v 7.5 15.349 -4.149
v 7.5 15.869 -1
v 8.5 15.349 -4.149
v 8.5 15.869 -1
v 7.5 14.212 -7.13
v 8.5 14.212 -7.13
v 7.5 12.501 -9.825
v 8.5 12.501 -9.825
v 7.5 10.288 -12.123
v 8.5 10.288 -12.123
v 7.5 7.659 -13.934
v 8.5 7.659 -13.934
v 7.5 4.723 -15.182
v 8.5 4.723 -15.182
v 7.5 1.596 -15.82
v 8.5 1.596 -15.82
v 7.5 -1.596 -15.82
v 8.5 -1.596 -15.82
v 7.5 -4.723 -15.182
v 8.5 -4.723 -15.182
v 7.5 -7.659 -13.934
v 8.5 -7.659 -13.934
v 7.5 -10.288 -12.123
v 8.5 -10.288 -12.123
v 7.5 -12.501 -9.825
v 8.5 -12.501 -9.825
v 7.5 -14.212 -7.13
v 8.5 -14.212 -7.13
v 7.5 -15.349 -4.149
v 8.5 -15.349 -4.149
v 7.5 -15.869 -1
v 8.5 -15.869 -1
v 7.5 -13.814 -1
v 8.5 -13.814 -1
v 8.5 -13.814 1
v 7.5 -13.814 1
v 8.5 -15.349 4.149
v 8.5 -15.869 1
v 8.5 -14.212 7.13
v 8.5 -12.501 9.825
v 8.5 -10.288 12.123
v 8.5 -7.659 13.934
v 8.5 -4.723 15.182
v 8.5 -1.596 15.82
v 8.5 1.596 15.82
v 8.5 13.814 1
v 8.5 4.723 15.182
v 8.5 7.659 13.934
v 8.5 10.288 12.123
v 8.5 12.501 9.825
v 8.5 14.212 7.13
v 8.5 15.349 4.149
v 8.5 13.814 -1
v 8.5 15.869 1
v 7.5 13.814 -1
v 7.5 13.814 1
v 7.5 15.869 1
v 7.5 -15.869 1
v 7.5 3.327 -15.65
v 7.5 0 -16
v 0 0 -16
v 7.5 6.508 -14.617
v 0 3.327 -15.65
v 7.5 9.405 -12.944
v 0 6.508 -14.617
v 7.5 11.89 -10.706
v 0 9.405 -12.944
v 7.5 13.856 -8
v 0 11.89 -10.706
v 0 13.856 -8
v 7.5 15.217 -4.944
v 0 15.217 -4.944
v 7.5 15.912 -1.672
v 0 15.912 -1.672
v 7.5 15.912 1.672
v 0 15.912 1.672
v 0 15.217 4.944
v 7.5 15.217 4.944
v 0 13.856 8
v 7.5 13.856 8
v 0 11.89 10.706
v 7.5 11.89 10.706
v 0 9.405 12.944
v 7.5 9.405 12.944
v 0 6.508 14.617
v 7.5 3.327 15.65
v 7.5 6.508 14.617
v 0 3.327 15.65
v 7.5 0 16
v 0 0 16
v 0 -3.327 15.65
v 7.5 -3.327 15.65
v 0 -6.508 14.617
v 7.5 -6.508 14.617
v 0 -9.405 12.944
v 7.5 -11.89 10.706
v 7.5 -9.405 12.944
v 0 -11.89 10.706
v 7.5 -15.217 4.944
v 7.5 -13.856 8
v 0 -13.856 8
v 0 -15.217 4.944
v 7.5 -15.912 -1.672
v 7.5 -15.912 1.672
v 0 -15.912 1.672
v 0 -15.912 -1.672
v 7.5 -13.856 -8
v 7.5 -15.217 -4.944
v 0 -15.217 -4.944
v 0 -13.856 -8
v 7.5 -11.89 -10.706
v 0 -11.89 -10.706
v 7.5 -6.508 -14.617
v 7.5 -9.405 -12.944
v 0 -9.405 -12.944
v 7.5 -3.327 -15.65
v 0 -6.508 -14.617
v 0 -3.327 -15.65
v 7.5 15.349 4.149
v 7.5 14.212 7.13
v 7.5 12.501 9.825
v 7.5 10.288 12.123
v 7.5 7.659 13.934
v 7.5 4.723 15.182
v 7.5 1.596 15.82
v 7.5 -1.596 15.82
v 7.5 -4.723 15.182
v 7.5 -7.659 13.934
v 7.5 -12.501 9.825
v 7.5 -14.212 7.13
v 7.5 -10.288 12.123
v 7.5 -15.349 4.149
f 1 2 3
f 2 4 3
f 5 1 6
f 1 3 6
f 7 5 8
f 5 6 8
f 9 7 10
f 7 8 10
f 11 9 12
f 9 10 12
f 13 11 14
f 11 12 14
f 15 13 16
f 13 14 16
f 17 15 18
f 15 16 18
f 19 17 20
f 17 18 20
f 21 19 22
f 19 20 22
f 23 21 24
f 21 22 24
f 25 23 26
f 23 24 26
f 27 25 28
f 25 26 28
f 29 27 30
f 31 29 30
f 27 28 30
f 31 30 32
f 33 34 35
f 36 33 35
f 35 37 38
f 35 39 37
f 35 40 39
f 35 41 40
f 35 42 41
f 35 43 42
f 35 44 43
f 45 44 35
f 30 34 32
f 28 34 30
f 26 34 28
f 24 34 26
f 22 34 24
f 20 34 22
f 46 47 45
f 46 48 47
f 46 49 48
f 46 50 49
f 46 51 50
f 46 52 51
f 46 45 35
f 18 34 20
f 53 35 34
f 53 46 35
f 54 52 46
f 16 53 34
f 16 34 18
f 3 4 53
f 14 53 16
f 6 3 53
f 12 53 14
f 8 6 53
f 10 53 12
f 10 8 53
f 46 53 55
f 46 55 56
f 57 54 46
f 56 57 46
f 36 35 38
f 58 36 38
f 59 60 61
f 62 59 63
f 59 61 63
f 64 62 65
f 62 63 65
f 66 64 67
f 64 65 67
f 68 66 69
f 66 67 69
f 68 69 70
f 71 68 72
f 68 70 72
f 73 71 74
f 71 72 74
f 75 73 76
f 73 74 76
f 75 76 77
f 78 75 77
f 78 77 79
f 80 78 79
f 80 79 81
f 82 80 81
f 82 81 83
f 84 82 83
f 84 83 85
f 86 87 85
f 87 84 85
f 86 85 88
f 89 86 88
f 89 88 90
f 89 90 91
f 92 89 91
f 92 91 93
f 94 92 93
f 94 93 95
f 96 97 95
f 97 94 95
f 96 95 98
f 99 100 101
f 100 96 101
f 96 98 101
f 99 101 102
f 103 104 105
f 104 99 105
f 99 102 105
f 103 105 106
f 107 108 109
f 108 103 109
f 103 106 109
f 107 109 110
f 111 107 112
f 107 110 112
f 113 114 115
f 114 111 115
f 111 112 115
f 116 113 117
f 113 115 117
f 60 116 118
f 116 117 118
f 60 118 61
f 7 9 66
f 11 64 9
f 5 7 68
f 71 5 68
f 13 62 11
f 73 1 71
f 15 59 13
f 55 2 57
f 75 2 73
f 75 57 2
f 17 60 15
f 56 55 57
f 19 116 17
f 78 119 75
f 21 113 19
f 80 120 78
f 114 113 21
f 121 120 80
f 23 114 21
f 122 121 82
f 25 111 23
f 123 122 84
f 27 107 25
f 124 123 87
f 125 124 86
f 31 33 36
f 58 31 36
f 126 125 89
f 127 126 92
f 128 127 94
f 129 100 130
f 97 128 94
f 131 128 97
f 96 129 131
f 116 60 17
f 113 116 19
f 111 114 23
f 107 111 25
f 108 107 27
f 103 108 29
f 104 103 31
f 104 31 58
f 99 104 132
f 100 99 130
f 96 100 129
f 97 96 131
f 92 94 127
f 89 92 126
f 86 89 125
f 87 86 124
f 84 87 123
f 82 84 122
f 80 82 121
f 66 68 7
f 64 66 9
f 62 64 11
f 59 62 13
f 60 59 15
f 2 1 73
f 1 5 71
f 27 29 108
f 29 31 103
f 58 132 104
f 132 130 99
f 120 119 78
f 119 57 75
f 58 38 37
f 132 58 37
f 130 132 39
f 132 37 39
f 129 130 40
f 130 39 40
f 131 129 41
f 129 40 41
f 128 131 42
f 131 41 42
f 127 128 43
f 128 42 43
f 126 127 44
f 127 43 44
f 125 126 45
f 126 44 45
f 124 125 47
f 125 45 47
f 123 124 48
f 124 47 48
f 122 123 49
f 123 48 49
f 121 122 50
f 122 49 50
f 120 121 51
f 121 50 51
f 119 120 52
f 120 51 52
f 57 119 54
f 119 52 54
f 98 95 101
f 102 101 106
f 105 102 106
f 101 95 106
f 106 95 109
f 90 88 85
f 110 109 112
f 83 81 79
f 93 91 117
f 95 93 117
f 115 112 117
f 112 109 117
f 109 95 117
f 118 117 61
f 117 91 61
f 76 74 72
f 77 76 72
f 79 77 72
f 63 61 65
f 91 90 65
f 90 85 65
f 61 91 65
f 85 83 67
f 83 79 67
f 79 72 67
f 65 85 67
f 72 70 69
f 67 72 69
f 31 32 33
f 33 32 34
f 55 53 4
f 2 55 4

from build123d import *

# Parameters (mm, degrees)
SKETCH1_R           = 16
BOSS_EXTRUDE1_DEPTH = 8.5
SKETCH2_W           = 1
SKETCH2_H           = 0.1
CUT_EXTRUDE1_DEPTH  = 1


with BuildPart() as part:
    # Sketch1 → Boss-Extrude1 (new body)
    with BuildSketch(Plane(origin=(0, 0, 0), x_dir=(0, 0, -1), z_dir=(1, 0, 0))):
        Circle(SKETCH1_R)
    extrude(amount=BOSS_EXTRUDE1_DEPTH)

    # Sketch2 → Cut-Revolve1 (revolve, cut)
    with BuildSketch(Plane.XY, mode=Mode.PRIVATE) as cut_revolve1_sk:
        with Locations((8, 15.95)):
            Rectangle(SKETCH2_W, SKETCH2_H)
    revolve(cut_revolve1_sk.sketch.rotate(Axis((8.5, 0, 0), (-1, 0, 0)), 90), axis=Axis((8.5, 0, 0), (-1, 0, 0)), mode=Mode.SUBTRACT)

    # Sketch3 → Cut-Extrude1 (cut)
    with BuildSketch(Plane(origin=(8.5, 0, 0), x_dir=(0, 0, -1), z_dir=(1, 0, 0))):
        Polygon((-1, 15.814143289), (-1, 17.814143289), (1, 17.814143289), (1, 15.814143289), (1, 13.814143289), (-1, 13.814143289), align=None)
        Polygon((1, -17.814143289), (1, -15.814143289), (1, -13.814143289), (-1, -13.814143289), (-1, -15.814143289), (-1, -17.814143289), align=None)
    extrude(amount=-CUT_EXTRUDE1_DEPTH, mode=Mode.SUBTRACT)


solid = part.part
